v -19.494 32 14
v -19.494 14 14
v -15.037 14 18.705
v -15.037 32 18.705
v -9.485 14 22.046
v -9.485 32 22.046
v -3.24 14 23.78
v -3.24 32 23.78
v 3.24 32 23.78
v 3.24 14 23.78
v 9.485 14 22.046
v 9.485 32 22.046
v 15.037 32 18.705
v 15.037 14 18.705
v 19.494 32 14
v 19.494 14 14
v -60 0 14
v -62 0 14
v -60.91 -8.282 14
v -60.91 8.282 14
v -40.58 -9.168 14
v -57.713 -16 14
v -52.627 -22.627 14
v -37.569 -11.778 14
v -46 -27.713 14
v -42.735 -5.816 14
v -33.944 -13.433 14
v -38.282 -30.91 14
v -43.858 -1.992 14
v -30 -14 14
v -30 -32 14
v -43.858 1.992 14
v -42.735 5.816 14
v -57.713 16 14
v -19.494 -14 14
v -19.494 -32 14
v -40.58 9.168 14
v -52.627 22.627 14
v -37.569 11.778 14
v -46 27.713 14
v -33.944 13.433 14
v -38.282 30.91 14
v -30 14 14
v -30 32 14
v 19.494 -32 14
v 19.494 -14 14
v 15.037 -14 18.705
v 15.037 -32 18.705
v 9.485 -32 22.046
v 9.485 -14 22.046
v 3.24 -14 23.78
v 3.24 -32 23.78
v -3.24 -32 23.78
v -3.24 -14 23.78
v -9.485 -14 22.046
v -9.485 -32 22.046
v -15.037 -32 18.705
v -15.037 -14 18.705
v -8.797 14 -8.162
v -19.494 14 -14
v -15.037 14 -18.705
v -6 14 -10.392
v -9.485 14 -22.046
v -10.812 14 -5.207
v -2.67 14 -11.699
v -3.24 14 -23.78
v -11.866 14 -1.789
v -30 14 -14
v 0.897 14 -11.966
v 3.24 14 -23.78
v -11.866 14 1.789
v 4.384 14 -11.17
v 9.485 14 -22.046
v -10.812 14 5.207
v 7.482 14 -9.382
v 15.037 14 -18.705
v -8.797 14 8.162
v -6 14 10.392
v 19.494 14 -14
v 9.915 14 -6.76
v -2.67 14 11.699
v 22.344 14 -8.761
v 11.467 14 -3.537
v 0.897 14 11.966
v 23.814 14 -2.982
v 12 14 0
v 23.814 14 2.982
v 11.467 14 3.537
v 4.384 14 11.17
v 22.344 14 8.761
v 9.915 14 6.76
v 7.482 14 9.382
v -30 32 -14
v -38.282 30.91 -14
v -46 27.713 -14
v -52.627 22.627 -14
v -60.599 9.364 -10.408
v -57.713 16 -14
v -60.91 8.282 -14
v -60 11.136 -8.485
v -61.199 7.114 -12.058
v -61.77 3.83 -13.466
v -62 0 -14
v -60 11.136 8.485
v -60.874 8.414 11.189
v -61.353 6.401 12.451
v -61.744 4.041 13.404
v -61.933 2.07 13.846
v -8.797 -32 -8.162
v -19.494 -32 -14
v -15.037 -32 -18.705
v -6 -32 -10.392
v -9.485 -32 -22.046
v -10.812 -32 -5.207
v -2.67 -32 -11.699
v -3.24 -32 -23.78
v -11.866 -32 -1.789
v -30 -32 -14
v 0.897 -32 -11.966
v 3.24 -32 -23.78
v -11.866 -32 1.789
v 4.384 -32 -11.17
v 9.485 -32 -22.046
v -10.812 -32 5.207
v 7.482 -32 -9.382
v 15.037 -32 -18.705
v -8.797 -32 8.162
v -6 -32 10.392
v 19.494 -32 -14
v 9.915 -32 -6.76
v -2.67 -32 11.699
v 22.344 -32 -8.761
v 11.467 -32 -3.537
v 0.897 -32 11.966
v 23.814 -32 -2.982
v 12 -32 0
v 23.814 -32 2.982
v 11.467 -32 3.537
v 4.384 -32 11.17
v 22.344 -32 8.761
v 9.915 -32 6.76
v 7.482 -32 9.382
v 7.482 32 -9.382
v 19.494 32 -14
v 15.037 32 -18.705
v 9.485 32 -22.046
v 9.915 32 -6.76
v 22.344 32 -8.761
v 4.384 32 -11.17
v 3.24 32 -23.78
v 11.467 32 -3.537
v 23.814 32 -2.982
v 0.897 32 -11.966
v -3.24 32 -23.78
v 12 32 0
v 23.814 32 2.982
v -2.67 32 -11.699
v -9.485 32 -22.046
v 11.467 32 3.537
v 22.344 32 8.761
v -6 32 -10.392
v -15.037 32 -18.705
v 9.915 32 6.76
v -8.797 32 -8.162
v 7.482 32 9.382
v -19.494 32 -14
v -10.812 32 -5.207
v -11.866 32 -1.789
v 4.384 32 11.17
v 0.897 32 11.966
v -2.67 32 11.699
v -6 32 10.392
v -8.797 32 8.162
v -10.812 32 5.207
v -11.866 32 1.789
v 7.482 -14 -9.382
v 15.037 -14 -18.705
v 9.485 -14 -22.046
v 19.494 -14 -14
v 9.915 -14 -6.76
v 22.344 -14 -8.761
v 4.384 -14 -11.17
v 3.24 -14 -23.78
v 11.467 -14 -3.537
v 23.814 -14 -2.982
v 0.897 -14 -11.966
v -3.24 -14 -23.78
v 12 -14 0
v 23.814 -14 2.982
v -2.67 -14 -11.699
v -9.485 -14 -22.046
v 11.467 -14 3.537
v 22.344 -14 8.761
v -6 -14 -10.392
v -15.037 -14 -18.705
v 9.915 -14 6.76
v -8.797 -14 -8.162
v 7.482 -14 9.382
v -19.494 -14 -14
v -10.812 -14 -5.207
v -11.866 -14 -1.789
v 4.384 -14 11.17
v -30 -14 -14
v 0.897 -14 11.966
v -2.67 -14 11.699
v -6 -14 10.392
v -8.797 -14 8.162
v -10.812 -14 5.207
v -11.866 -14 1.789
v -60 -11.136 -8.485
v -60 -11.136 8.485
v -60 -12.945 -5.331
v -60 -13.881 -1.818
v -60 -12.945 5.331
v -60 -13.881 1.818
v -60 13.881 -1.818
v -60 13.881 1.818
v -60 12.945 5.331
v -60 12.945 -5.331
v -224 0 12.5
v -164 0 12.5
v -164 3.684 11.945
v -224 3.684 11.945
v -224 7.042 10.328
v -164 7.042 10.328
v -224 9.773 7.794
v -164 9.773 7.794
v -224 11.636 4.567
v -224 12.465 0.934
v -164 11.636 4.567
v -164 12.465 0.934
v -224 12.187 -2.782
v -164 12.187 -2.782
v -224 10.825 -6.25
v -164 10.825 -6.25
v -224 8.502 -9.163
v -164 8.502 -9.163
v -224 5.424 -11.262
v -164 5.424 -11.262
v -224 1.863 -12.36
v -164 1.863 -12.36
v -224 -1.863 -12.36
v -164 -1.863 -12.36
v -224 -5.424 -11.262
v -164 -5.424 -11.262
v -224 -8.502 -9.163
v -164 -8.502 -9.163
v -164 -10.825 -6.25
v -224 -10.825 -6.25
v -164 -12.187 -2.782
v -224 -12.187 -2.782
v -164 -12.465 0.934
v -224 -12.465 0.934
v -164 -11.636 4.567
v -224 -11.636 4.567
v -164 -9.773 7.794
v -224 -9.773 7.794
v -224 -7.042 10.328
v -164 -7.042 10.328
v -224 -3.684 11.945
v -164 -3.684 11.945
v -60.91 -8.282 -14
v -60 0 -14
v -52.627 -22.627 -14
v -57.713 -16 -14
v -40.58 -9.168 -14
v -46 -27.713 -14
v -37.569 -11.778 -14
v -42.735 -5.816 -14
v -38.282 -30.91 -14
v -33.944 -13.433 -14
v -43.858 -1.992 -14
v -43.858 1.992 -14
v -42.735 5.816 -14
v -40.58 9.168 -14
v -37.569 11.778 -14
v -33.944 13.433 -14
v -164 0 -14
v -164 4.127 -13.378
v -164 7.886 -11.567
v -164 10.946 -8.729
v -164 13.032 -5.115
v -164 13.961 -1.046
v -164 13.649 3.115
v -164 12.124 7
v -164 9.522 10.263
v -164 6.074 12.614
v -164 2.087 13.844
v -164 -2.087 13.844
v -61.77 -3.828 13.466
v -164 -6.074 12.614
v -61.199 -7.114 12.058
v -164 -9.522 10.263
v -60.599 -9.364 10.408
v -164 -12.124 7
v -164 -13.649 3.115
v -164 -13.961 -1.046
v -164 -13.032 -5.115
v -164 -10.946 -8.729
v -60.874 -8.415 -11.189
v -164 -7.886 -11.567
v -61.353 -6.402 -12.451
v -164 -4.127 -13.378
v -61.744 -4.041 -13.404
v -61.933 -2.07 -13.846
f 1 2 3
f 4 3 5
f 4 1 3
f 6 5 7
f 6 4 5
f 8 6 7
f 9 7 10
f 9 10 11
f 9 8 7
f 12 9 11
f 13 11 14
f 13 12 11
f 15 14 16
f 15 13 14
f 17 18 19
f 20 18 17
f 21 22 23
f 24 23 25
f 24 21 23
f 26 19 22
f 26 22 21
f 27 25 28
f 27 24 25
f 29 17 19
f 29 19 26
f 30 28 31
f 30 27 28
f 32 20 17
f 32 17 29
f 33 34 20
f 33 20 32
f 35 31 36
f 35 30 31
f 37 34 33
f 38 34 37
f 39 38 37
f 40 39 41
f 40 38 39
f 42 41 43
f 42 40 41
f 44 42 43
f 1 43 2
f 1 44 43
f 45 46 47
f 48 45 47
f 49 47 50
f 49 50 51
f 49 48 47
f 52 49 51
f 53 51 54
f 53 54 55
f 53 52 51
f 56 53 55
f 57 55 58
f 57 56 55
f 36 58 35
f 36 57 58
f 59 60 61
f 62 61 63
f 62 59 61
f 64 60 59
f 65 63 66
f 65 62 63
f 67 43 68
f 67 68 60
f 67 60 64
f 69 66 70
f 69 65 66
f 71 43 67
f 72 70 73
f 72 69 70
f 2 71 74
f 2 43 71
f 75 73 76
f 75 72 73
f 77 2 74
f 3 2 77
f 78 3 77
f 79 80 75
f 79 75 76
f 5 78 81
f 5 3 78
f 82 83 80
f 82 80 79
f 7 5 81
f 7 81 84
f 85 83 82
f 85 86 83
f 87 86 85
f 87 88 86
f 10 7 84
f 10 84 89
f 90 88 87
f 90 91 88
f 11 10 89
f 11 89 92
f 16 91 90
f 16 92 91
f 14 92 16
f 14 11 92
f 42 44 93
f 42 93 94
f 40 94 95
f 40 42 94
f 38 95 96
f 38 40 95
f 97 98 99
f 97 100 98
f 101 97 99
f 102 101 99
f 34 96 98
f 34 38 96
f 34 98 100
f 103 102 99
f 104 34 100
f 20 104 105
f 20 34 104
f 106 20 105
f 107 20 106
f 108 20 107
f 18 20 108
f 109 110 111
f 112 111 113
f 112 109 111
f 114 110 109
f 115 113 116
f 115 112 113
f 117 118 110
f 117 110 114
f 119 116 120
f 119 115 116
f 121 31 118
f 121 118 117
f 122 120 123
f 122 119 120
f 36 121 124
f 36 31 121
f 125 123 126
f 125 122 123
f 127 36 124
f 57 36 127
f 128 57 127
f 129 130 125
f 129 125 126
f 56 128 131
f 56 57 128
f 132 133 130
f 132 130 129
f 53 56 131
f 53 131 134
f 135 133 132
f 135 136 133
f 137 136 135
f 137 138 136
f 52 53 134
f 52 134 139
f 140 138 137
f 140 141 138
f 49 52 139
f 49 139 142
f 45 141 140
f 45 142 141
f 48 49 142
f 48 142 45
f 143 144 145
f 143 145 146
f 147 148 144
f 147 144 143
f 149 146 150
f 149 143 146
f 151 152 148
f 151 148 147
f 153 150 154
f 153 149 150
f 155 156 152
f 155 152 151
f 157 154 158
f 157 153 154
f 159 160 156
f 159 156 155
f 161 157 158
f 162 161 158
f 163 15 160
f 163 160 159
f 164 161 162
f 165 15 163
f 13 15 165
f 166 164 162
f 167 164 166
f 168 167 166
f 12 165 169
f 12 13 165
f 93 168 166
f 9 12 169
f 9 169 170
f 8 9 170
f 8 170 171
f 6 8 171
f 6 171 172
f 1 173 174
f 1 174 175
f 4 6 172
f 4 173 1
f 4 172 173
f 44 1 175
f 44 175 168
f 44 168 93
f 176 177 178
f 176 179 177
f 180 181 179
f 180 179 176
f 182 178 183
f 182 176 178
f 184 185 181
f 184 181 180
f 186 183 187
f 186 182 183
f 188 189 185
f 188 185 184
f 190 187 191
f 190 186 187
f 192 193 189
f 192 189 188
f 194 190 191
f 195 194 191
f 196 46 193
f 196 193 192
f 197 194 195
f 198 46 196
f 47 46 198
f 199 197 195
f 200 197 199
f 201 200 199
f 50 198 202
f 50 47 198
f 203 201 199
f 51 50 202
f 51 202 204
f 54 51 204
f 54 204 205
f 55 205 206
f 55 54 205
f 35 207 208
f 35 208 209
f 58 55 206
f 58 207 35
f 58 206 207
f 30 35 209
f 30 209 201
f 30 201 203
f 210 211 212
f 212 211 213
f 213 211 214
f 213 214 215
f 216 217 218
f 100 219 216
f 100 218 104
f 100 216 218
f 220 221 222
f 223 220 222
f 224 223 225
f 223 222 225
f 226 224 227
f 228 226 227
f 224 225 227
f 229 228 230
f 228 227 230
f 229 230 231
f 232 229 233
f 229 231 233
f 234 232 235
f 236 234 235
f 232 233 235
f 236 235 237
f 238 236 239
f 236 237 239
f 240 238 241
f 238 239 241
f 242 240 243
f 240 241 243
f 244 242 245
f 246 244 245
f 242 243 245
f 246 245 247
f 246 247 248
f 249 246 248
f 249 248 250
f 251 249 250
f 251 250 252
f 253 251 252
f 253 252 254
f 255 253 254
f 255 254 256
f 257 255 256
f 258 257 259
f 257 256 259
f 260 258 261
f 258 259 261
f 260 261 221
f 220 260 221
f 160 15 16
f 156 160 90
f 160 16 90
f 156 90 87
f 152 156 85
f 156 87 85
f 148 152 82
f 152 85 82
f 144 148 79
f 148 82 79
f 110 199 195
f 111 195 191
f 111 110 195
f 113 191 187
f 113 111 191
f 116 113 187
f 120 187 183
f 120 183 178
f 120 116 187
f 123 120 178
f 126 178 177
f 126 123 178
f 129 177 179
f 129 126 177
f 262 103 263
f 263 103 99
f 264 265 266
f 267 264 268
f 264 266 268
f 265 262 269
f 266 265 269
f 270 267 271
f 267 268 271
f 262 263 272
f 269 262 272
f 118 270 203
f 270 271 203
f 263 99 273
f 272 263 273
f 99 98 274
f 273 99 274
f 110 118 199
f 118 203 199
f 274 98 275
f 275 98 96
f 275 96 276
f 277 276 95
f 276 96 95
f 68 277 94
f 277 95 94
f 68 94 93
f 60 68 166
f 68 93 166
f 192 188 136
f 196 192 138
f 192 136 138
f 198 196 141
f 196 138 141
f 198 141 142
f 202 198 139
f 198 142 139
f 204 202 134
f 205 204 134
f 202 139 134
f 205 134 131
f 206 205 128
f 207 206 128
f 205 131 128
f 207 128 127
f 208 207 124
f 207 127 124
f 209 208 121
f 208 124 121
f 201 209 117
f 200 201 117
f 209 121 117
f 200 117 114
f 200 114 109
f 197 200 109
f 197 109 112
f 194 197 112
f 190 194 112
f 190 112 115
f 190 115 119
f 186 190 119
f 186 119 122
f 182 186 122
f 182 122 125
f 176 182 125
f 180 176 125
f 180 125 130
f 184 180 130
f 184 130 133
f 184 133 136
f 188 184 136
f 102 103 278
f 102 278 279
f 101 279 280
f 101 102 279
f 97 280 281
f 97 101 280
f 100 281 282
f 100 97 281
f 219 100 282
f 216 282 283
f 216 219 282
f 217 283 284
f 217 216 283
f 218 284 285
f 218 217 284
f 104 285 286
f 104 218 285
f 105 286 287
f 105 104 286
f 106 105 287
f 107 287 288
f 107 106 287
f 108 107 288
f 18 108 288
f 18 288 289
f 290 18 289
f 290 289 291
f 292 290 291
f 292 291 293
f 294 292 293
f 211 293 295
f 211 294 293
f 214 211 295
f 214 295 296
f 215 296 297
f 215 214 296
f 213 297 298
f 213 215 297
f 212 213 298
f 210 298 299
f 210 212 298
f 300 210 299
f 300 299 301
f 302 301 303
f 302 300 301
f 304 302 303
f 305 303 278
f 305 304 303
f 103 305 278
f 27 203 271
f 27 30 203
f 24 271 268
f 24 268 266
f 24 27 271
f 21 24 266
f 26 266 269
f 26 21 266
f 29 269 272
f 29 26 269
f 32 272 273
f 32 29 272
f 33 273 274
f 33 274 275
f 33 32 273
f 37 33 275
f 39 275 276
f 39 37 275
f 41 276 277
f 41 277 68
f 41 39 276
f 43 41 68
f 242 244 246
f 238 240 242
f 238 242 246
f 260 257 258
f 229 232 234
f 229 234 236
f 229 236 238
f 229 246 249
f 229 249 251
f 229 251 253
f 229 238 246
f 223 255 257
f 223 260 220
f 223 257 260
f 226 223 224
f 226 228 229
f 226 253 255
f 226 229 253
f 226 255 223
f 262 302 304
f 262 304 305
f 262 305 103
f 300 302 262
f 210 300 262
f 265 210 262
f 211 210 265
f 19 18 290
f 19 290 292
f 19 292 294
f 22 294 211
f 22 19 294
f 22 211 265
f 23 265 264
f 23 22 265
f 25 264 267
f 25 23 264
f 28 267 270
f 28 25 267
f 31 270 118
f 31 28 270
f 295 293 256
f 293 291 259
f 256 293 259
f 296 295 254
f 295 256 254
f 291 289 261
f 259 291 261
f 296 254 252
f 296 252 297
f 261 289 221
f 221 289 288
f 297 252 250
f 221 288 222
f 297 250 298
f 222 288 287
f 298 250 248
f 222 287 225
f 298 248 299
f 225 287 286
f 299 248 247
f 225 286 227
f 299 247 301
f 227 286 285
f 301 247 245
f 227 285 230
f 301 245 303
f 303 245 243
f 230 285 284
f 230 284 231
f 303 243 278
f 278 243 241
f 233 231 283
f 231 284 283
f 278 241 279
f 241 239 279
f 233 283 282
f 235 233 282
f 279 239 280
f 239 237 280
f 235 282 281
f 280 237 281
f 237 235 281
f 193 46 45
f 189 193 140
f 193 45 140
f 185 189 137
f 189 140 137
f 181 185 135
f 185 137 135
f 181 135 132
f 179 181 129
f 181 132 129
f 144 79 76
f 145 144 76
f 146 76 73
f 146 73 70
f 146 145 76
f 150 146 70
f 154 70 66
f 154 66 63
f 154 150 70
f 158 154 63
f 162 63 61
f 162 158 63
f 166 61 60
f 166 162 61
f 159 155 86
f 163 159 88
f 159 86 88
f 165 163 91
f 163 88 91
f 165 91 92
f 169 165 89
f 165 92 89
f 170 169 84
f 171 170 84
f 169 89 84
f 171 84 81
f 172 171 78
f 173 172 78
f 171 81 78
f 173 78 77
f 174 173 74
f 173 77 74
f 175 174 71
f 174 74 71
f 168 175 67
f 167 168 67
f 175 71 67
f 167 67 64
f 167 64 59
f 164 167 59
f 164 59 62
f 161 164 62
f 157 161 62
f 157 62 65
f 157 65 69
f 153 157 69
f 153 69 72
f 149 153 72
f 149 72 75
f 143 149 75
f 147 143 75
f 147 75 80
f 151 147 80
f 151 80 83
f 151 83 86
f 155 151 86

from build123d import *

# Parameters (mm, degrees)
BOSS_EXTRUDE1_DEPTH = 14
BOSS_EXTRUDE4_START = -60
SKETCH3_R           = 14
BOSS_EXTRUDE4_DEPTH = 104
SKETCH4_R           = 12.5
BOSS_EXTRUDE5_DEPTH = 60
SKETCH5_R           = 24
BOSS_EXTRUDE7_DEPTH = 18
SKETCH7_R           = 24
BOSS_EXTRUDE8_DEPTH = 18
CUT_EXTRUDE2_DEPTH  = 85
SKETCH10_R          = 12
CUT_EXTRUDE3_DEPTH  = 85


with BuildPart() as part:
    # Sketch2 → Boss-Extrude1 (new body, symmetric)
    with BuildSketch(Plane.XY):
        with BuildLine():
            Line((30, 14), (30, 32))
            Line((30, 32), (-30, 32))
            ThreePointArc((-30, 32), (-62, 0), (-30, -32))
            Line((-30, -32), (30, -32))
            Line((30, -32), (30, -14))
            Line((30, -14), (-30, -14))
            ThreePointArc((-30, -14), (-44, 0), (-30, 14))
            Line((-30, 14), (30, 14))
        make_face()
    extrude(amount=BOSS_EXTRUDE1_DEPTH, both=True)

    # Sketch3 → Boss-Extrude4 (add)
    with BuildSketch(Plane(origin=(0, 0, 0), x_dir=(0, 0, -1), z_dir=(1, 0, 0)).offset(BOSS_EXTRUDE4_START)):
        Circle(SKETCH3_R)
    extrude(amount=-BOSS_EXTRUDE4_DEPTH)

    # Sketch4 → Boss-Extrude5 (add)
    with BuildSketch(Plane.ZY.offset(164)):
        Circle(SKETCH4_R)
    extrude(amount=BOSS_EXTRUDE5_DEPTH)

    # Sketch5 → Boss-Extrude7 (add)
    with BuildSketch(Plane(origin=(0, 32, 0), x_dir=(1, 0, 0), z_dir=(0, 1, 0))):
        Circle(SKETCH5_R)
    extrude(amount=-BOSS_EXTRUDE7_DEPTH)

    # Sketch7 → Boss-Extrude8 (add)
    with BuildSketch(Plane.XZ.offset(32)):
        Circle(SKETCH7_R)
    extrude(amount=-BOSS_EXTRUDE8_DEPTH)

    # Sketch8 → Cut-Extrude2 (cut)
    with BuildSketch(Plane.XZ.offset(32)):
        with BuildLine():
            Line((19.49358869, -14), (30, -14))
            Line((30, -14), (30, 14))
            Line((30, 14), (19.49358869, 14))
            ThreePointArc((19.49358869, 14), (24, 0), (19.49358869, -14))
        make_face()
    extrude(amount=-CUT_EXTRUDE2_DEPTH, mode=Mode.SUBTRACT)

    # Sketch10 → Cut-Extrude3 (cut)
    with BuildSketch(Plane.XZ.offset(32)):
        Circle(SKETCH10_R)
    extrude(amount=-CUT_EXTRUDE3_DEPTH, mode=Mode.SUBTRACT)


solid = part.part
